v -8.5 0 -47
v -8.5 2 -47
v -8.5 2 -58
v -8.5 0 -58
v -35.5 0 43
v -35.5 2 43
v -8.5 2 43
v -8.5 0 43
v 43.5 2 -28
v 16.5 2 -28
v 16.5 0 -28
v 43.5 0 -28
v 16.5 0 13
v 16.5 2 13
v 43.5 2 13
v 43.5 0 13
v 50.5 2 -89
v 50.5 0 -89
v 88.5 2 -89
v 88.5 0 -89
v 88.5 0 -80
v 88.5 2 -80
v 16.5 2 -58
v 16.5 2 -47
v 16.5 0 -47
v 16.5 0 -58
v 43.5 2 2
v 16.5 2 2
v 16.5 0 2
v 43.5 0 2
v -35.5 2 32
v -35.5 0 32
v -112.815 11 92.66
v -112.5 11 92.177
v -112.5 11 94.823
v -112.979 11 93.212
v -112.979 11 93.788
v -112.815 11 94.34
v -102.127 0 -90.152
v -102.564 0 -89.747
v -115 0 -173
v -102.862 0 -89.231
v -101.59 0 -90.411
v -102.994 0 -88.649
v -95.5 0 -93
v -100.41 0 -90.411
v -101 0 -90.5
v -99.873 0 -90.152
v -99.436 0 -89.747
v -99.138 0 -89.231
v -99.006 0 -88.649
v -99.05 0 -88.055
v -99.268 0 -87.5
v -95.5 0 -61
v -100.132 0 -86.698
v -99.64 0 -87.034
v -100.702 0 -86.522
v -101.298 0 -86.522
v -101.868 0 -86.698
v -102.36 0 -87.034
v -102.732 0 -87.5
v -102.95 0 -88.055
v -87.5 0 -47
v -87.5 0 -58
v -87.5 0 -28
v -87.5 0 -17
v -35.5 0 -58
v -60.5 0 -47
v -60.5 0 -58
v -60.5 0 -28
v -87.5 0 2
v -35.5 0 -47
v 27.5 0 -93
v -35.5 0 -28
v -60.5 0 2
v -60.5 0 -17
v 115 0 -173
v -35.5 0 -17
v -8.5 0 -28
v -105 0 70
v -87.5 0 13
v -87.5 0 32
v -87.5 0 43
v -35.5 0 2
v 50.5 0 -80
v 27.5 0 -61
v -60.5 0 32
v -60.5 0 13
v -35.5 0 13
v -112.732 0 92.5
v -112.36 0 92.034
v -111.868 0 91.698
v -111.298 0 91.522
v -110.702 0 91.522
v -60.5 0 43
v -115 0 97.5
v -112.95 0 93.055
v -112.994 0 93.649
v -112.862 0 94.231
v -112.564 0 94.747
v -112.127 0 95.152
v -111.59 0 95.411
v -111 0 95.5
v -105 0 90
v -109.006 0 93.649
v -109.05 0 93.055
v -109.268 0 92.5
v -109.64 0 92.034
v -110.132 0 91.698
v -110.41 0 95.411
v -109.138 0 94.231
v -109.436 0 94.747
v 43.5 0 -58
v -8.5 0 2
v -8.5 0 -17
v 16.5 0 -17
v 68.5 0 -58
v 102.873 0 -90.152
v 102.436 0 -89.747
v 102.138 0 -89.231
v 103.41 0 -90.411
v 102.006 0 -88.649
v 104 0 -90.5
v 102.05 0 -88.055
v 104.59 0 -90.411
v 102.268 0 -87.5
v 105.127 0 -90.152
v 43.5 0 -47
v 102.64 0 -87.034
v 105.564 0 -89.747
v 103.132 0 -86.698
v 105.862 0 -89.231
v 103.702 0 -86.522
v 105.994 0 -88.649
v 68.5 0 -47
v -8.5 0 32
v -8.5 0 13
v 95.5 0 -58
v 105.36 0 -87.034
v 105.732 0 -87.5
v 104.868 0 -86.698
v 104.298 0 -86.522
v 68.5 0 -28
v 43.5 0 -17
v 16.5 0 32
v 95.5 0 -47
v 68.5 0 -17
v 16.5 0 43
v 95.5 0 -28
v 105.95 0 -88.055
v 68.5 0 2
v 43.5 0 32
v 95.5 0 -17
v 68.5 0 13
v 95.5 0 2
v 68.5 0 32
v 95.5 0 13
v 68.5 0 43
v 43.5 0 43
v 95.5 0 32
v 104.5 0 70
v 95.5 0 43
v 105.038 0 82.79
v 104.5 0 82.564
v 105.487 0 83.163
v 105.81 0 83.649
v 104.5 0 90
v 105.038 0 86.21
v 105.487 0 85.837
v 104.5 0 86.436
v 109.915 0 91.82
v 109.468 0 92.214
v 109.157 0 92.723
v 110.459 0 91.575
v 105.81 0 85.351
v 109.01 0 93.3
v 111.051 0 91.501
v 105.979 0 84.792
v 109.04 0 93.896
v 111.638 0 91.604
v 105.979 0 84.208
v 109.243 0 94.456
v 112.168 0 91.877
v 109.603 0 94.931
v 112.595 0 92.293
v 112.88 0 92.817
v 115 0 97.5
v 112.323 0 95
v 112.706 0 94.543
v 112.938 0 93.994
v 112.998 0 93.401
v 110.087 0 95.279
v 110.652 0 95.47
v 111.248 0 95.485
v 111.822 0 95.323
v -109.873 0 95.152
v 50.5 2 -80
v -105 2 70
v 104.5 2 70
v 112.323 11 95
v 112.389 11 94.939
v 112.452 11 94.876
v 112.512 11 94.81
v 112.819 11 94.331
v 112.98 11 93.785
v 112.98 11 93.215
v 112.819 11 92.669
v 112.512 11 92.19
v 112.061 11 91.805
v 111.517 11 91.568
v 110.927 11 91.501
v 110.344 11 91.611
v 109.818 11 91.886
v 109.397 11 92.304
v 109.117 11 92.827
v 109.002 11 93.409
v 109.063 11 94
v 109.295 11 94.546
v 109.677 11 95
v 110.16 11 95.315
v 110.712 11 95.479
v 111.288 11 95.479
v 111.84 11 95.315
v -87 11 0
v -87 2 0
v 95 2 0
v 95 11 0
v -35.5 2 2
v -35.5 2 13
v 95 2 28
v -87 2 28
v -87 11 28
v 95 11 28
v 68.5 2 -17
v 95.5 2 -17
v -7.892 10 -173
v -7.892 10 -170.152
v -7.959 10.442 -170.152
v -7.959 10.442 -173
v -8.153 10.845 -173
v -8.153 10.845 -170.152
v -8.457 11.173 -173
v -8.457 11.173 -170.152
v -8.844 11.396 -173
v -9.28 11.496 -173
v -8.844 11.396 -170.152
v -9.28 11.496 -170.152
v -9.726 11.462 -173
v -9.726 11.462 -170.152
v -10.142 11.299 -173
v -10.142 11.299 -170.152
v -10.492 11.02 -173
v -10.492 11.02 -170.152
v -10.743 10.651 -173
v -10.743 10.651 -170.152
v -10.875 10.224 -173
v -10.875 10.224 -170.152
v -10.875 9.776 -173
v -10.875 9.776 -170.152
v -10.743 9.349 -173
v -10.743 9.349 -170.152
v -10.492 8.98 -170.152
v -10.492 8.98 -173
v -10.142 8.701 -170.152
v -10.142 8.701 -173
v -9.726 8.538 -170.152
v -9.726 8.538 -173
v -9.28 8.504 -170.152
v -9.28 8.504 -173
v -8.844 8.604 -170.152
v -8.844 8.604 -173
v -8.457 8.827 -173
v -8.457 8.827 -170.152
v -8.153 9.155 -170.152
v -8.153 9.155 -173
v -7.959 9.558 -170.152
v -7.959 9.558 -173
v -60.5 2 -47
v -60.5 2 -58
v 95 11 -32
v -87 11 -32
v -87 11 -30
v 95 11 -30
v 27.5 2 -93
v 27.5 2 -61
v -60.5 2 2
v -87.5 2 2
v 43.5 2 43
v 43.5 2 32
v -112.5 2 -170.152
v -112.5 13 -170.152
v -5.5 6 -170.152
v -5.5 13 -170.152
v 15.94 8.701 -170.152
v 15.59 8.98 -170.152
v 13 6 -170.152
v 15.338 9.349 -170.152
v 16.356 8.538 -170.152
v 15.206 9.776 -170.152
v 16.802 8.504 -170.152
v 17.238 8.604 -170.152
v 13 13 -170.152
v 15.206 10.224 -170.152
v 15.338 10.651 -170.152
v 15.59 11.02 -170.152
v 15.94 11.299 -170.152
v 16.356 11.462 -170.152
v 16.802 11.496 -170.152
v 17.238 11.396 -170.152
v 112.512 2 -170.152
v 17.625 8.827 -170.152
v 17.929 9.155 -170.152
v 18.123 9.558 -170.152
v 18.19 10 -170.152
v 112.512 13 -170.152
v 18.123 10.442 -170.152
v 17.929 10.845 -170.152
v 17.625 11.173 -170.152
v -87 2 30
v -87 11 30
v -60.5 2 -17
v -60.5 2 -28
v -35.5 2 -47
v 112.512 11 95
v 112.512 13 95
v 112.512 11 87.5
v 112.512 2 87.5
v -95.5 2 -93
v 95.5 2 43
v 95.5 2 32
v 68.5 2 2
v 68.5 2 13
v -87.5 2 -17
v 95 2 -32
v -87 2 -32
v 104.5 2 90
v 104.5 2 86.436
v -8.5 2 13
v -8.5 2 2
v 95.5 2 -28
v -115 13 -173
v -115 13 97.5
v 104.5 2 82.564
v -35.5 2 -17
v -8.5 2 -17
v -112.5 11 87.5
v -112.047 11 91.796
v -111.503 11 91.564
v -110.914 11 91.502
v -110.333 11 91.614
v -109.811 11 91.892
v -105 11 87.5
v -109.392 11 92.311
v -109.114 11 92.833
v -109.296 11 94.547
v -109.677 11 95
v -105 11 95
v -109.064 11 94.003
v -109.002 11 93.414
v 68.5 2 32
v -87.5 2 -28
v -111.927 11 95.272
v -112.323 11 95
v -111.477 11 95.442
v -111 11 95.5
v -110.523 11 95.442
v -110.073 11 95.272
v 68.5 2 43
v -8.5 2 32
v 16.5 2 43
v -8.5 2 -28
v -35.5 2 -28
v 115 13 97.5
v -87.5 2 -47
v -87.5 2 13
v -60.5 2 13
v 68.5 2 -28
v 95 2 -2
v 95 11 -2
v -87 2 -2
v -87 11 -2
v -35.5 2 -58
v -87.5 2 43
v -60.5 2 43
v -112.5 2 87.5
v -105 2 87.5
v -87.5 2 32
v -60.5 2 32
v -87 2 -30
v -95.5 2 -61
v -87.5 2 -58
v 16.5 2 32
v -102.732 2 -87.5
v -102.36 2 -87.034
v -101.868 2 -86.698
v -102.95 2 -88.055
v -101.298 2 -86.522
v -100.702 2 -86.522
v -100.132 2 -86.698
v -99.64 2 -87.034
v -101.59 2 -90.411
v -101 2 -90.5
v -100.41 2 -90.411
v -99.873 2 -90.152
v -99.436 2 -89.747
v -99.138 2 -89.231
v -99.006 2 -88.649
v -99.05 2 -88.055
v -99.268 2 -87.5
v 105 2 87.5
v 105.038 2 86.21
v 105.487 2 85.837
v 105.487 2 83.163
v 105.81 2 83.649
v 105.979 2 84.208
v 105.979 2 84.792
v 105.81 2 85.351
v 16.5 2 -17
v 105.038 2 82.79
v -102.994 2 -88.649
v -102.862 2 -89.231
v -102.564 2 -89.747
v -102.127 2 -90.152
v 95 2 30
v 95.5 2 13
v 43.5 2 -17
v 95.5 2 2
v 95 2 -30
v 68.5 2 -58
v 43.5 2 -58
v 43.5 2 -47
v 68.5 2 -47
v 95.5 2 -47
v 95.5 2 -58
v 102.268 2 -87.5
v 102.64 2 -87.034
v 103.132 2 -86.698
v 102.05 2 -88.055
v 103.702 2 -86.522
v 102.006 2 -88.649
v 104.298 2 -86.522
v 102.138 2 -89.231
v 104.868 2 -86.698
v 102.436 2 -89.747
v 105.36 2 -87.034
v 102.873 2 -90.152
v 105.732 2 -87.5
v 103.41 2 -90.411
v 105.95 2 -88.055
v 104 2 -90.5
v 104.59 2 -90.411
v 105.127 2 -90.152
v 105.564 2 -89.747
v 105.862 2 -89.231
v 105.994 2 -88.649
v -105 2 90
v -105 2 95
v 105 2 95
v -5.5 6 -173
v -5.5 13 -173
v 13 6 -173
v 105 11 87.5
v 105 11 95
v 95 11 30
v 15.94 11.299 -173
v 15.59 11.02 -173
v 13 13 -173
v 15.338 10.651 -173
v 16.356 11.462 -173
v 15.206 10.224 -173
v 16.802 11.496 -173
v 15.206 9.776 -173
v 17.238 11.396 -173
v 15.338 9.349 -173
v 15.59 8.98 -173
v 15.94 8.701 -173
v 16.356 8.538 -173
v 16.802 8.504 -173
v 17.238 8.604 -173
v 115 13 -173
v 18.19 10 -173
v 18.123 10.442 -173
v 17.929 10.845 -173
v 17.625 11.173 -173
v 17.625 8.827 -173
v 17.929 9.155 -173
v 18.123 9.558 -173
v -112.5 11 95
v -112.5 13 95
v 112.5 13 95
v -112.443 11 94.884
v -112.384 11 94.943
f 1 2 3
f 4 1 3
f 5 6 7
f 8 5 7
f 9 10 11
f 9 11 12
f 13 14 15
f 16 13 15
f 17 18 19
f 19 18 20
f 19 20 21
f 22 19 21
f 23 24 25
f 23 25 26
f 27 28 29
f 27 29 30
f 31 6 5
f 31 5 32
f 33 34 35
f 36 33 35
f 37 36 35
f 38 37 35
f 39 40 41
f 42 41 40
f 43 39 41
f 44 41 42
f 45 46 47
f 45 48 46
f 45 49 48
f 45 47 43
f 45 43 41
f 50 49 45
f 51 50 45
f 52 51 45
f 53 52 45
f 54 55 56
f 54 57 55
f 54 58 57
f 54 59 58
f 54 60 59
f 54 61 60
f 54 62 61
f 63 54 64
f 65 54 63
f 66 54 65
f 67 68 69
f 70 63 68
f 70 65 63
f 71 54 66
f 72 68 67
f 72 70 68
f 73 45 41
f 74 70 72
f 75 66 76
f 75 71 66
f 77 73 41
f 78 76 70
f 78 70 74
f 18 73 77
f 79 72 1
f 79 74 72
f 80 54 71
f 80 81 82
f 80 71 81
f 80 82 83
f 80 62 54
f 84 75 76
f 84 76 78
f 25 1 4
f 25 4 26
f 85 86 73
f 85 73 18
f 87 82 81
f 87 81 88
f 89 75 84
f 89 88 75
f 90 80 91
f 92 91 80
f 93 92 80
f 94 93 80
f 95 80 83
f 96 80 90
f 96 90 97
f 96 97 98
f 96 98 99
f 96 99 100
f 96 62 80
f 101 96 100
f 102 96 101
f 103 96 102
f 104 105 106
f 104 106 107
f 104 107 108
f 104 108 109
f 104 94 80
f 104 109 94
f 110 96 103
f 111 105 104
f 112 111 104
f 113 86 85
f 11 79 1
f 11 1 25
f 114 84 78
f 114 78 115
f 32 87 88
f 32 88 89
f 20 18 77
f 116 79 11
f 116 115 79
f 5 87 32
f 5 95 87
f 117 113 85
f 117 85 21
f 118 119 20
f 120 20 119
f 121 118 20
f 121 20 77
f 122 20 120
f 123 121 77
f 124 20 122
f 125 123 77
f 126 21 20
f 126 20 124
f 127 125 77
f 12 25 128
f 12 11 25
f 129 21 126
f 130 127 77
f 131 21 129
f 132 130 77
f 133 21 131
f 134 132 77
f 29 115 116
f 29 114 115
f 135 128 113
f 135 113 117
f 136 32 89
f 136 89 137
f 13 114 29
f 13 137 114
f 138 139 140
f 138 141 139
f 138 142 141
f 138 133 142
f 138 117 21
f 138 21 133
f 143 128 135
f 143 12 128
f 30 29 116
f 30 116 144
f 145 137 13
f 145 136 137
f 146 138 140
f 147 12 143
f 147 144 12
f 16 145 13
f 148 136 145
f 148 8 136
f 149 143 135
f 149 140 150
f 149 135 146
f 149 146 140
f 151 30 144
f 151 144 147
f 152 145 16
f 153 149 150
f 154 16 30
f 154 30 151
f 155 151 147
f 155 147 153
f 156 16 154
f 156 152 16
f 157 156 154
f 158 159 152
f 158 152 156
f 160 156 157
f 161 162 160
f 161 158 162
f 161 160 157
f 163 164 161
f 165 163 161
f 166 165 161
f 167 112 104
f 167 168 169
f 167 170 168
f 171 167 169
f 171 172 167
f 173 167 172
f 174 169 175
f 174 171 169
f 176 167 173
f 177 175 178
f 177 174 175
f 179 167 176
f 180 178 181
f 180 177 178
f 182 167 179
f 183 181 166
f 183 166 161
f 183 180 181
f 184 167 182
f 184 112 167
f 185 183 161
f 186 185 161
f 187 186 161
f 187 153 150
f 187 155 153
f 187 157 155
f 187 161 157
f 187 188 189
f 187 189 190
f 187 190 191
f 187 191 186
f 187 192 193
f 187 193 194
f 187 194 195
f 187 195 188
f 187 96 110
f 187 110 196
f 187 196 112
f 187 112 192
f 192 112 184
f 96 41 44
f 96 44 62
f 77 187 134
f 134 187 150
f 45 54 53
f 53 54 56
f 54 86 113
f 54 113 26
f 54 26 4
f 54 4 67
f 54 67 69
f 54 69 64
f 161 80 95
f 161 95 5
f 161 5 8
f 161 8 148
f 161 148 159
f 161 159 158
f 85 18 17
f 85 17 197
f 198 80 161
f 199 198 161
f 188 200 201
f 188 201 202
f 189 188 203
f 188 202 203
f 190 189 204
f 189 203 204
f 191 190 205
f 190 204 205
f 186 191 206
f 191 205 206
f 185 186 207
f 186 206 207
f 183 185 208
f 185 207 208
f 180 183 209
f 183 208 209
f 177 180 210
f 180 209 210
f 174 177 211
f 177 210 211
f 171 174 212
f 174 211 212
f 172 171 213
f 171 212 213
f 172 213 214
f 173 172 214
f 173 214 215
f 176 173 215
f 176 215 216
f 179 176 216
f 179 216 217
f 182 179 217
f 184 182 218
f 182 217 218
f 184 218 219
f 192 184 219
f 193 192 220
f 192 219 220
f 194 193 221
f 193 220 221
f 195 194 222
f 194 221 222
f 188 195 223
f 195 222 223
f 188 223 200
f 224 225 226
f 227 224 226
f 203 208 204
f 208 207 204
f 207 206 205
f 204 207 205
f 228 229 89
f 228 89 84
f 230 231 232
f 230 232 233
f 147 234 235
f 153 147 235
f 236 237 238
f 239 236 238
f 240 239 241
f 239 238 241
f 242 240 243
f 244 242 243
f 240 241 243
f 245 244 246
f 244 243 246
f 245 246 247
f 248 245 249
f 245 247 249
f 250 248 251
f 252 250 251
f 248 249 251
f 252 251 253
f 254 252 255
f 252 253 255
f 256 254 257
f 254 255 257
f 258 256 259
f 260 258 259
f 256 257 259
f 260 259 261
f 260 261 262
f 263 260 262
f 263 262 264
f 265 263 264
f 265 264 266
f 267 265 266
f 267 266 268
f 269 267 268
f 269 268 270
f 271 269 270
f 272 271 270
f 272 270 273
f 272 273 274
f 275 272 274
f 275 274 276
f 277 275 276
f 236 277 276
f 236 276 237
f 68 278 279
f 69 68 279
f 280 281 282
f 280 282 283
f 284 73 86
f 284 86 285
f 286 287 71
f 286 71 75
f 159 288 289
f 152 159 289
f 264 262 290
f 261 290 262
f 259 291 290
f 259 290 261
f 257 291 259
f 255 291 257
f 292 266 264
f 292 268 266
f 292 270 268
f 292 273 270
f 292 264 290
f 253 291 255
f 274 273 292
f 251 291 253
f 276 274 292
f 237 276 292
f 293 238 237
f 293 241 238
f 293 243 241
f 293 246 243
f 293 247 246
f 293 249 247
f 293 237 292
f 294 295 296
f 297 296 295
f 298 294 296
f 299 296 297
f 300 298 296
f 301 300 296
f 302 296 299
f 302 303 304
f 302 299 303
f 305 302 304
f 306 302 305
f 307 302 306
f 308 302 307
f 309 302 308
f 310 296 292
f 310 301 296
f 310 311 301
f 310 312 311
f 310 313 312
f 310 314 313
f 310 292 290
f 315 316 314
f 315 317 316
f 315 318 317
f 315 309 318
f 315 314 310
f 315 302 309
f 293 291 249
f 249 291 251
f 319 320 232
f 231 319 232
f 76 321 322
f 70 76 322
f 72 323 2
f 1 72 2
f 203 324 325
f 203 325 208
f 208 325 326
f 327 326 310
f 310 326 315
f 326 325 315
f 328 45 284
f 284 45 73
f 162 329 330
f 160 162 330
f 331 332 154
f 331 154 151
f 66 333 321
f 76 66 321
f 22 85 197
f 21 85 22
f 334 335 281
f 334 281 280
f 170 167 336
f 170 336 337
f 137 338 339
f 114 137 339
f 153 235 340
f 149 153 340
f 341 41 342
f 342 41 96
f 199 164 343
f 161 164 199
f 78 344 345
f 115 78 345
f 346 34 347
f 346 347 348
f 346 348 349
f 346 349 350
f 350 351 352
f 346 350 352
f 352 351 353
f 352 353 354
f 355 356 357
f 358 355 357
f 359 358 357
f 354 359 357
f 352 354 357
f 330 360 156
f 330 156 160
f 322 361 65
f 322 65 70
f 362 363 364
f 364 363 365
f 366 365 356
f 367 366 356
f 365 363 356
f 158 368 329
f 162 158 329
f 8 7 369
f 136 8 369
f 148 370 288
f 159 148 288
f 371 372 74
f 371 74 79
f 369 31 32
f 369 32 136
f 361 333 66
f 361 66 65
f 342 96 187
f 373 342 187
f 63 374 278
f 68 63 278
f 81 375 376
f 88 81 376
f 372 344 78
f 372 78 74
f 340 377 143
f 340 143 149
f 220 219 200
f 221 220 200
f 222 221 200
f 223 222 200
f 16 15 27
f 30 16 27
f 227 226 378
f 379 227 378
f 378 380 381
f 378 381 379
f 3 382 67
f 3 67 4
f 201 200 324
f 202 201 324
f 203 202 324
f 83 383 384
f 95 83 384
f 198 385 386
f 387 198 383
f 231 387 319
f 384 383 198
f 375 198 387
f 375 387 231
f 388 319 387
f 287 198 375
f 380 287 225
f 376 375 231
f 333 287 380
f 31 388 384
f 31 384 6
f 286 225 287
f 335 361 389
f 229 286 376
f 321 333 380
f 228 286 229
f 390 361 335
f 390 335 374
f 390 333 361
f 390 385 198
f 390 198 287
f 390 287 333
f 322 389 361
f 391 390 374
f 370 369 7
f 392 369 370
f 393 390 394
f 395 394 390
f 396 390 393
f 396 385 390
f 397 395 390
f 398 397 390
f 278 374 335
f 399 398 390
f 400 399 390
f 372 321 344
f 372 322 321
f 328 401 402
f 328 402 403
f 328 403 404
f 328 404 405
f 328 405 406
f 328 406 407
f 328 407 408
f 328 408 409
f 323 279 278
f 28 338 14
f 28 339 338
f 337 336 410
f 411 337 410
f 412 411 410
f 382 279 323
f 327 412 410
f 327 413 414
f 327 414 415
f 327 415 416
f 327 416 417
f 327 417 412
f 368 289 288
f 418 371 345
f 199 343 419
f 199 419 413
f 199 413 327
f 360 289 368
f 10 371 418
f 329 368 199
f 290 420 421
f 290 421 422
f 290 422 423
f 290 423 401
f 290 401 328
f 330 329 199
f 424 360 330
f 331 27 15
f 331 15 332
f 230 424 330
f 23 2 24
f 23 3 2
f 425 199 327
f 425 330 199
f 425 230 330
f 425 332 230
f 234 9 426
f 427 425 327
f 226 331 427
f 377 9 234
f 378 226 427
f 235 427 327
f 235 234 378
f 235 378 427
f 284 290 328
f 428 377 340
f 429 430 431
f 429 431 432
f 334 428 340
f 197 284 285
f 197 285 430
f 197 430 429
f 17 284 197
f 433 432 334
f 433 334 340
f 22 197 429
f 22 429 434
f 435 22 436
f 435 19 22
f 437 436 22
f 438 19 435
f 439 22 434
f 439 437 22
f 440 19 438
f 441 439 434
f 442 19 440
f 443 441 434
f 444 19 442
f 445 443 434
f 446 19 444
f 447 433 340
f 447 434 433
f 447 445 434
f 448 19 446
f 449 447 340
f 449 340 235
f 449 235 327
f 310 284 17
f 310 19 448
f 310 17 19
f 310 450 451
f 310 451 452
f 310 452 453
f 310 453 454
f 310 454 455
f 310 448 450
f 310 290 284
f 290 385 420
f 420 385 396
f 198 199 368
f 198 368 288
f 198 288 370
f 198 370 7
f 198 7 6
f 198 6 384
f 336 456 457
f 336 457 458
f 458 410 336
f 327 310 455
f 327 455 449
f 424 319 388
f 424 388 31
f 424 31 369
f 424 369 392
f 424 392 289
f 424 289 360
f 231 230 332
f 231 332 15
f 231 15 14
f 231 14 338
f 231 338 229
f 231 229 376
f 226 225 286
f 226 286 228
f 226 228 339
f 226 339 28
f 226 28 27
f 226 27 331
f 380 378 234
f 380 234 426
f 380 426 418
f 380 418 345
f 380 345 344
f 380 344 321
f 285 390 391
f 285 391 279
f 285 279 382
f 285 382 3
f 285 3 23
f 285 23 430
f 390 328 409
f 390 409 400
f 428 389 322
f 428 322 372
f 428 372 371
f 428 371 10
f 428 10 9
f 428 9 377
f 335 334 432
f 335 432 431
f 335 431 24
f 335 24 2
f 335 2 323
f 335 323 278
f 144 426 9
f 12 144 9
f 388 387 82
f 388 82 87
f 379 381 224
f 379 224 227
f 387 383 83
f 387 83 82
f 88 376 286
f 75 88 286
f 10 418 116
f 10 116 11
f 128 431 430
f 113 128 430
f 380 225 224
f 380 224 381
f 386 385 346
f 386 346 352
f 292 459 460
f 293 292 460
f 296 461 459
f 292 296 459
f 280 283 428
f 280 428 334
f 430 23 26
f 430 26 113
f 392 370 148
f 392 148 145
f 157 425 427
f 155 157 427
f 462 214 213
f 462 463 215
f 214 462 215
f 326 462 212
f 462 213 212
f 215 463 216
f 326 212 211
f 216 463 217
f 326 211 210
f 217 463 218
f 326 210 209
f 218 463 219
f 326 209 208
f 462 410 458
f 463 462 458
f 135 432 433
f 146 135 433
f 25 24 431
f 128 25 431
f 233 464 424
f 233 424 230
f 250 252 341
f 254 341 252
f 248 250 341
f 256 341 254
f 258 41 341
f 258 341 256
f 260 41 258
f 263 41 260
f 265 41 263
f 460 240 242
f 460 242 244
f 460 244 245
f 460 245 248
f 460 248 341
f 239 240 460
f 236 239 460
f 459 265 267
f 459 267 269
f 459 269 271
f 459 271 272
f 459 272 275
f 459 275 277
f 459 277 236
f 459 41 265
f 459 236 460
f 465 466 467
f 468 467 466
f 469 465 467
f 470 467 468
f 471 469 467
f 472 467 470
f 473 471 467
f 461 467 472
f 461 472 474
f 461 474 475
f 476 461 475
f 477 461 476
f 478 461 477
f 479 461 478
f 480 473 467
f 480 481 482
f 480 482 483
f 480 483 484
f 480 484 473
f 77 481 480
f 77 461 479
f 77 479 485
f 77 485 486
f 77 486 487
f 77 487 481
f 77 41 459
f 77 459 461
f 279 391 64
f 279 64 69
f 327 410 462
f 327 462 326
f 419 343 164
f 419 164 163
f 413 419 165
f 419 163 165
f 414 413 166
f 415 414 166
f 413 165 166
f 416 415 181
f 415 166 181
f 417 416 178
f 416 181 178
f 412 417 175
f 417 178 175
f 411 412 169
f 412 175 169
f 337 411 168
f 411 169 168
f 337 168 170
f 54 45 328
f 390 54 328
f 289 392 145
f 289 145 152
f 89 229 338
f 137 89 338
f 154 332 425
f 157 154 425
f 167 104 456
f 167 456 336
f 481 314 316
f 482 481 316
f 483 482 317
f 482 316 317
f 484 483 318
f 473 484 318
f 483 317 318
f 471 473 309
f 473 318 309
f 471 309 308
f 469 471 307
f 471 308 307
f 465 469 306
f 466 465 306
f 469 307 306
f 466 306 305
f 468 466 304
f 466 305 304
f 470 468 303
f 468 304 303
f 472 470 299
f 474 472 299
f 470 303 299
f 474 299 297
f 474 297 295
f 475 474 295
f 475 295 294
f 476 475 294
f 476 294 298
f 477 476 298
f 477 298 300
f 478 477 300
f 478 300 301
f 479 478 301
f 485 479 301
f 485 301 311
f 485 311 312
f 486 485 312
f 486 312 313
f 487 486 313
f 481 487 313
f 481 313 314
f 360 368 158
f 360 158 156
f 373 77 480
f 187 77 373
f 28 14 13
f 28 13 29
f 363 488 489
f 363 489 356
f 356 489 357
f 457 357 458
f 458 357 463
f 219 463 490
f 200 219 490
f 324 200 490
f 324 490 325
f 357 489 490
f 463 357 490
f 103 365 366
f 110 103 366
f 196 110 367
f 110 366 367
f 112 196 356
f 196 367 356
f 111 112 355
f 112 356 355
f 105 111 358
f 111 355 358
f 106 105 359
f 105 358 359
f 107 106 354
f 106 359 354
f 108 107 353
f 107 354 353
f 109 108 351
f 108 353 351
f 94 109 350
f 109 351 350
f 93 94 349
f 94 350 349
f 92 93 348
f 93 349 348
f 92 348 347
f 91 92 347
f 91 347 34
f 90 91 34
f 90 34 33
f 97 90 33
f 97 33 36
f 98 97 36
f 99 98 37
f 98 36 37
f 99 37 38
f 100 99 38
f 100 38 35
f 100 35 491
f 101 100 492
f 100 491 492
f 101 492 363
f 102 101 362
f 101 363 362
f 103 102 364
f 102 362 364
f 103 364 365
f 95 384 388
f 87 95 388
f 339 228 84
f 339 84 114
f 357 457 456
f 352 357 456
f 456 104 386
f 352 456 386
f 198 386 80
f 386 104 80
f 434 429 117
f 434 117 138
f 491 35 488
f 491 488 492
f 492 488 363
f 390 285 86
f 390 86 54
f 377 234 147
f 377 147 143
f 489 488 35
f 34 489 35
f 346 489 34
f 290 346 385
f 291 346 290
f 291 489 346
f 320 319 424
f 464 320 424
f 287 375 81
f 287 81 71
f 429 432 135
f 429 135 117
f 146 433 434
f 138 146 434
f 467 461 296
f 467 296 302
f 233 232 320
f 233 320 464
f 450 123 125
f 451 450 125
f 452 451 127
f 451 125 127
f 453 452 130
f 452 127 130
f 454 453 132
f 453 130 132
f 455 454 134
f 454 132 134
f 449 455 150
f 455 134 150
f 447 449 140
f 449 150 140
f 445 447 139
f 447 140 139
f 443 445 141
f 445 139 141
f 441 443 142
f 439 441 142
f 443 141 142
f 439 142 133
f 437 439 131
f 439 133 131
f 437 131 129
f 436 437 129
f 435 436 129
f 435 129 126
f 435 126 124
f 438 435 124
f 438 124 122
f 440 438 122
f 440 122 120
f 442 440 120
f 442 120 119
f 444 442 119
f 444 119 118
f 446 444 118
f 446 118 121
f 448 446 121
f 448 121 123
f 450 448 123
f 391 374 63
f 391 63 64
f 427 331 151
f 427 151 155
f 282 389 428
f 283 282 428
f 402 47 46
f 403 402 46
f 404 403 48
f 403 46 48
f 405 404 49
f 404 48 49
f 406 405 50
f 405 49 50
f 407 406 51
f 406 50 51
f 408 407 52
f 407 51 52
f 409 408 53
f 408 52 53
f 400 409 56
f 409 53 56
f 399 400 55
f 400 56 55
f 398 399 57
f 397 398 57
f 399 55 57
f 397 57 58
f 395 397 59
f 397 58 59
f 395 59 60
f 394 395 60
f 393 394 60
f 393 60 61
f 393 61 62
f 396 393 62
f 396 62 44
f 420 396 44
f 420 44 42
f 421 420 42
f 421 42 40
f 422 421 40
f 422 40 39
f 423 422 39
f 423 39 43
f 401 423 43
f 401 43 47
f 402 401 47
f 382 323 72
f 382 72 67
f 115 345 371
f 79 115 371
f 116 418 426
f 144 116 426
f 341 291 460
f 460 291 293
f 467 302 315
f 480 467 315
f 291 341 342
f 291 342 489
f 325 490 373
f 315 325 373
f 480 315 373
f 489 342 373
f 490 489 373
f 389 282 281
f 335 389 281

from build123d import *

# Parameters (mm, degrees)
ESQUISSE3_W              = 225
ESQUISSE3_H              = 190
ESQUISSE3_W_2            = 209.5
ESQUISSE3_H_2            = 20
ESQUISSE3_W_3            = 123
ESQUISSE3_H_3            = 30
BLOC_COQUE_DEPTH         = 16
ESQUISSE5_W              = 27
ESQUISSE5_H              = 11
TROU_CARTOUCHE_DEPTH     = 149.112288484
COQUE5_START             = -61
COQUE5_OUTLINE_W         = 13
COQUE5_OUTLINE_H         = 14
COQUE5_OUTLINE_W_2       = 21
COQUE5_DEPTH             = 129
COQUE5_START_2           = -93
COQUE5_2_OUTLINE_W       = 81
COQUE5_2_OUTLINE_H       = 14
COQUE5_2_OUTLINE_W_2     = 13
COQUE5_2_DEPTH           = 33
COQUE5_START_3           = 45
COQUE5_3_OUTLINE_W       = 31
COQUE5_3_OUTLINE_H       = 14
COQUE5_3_DEPTH           = 23
COQUE5_START_4           = -45
COQUE5_4_OUTLINE_W       = 31
COQUE5_4_OUTLINE_H       = 14
COQUE5_4_DEPTH           = 15
COQUE5_START_5           = -15
COQUE5_5_OUTLINE_W       = 31
COQUE5_5_OUTLINE_H       = 14
COQUE5_5_DEPTH           = 15
COQUE5_START_6           = 15
COQUE5_6_OUTLINE_W       = 31
COQUE5_6_OUTLINE_H       = 14
COQUE5_6_DEPTH           = 15
COQUE5_START_7           = 92
COQUE5_7_OUTLINE_W       = 221
COQUE5_7_OUTLINE_H       = 14
COQUE5_7_DEPTH           = 1
COQUE5_START_8           = 68
COQUE5_8_OUTLINE_W       = 4
COQUE5_8_OUTLINE_H       = 14
COQUE5_8_OUTLINE_W_2     = 3.5
COQUE5_8_DEPTH           = 24
COQUE5_9_OUTLINE_W       = 15
COQUE5_9_OUTLINE_H       = 14
COQUE5_9_OUTLINE_W_2     = 31
COQUE5_9_DEPTH           = 1
ESQUISSE6_W              = 138
ESQUISSE6_H              = 183.5
LOGEMENT_CARTE_DEPTH     = 6
ESQUISSE10_R             = 2
ENL_V_MAT_EXTRU_2_DEPTH  = 15
ESQUISSE12_W             = 100
ESQUISSE12_H             = 186
ENL_V_MAT_EXTRU_4_DEPTH  = 6
ESQUISSE13_W             = 123
ESQUISSE13_H             = 10
ENL_V_MAT_EXTRU_5_DEPTH  = 2
ESQUISSE14_W             = 200
ESQUISSE14_H             = 108.975087814
ENL_V_MAT_EXTRU_6_DEPTH  = 8
ESQUISSE16_W             = 38
ESQUISSE16_H             = 9
ENL_V_MAT_EXTRU_7_DEPTH  = 10
ESQUISSE17_W             = 230
ESQUISSE17_H             = 195
ESQUISSE17_W_2           = 225
ESQUISSE17_H_2           = 190
BOSS_EXTRU_2_DEPTH       = 13
ESQUISSE18_W             = 230
ESQUISSE18_H             = 4.5
ENL_V_MAT_EXTRU_8_DEPTH  = 152.328285525
ESQUISSE20_W             = 230
ESQUISSE20_H             = 80
BOSS_EXTRU_3_DEPTH       = 13
ESQUISSE21_W             = 225
ESQUISSE21_H             = 75.152232857
ENL_V_MAT_EXTRU_9_DEPTH  = 7
ESQUISSE25_W             = 18.5
ESQUISSE25_H             = 9.5
ENL_V_MAT_EXTRU_11_DEPTH = 10
ESQUISSE29_R             = 1.5
ENL_V_MAT_EXTRU_14_DEPTH = 6
ESQUISSE36_W             = 225.011669516
ESQUISSE36_H             = 265.152232857
ENL_V_MAT_EXTRU_18_DEPTH = 14
ESQUISSE30_W             = 10
ESQUISSE30_H             = 10
BOSS_EXTRU_4_DEPTH       = 11
ESQUISSE33_R             = 2
ENL_V_MAT_EXTRU_16_DEPTH = 209.026440627
ESQUISSE37_W             = 182
ESQUISSE37_H             = 2
BOSS_EXTRU_6_DEPTH       = 9


# Read off the part's stored shape, not the designer's step: Coque5
with BuildPart() as part:
    # Esquisse3 → Bloc coque (new body)
    with BuildSketch(Plane(origin=(0, 0, 0), x_dir=(1, 0, 0), z_dir=(0, 1, 0))):
        Rectangle(ESQUISSE3_W, ESQUISSE3_H)
        with Locations((-0.25, -80)):
            Rectangle(ESQUISSE3_W_2, ESQUISSE3_H_2, mode=Mode.SUBTRACT)
        with Locations((-34, 78)):
            Rectangle(ESQUISSE3_W_3, ESQUISSE3_H_3, mode=Mode.SUBTRACT)
    extrude(amount=BLOC_COQUE_DEPTH)

    # Esquisse5 → Trou cartouche (cut, through all)
    with BuildSketch(Plane(origin=(0, 16, 0), x_dir=(1, 0, 0), z_dir=(0, 1, 0))):
        with Locations((-74, 52.5)):
            Rectangle(ESQUISSE5_W, ESQUISSE5_H)
        with Locations((-22, 52.5)):
            Rectangle(ESQUISSE5_W, ESQUISSE5_H)
        with Locations((30, 52.5)):
            Rectangle(ESQUISSE5_W, ESQUISSE5_H)
        with Locations((82, 52.5)):
            Rectangle(ESQUISSE5_W, ESQUISSE5_H)
        with Locations((-22, 22.5)):
            Rectangle(ESQUISSE5_W, ESQUISSE5_H)
        with Locations((30, 22.5)):
            Rectangle(ESQUISSE5_W, ESQUISSE5_H)
        with Locations((82, 22.5)):
            Rectangle(ESQUISSE5_W, ESQUISSE5_H)
        with Locations((-22, -7.5)):
            Rectangle(ESQUISSE5_W, ESQUISSE5_H)
        with Locations((30, -7.5)):
            Rectangle(ESQUISSE5_W, ESQUISSE5_H)
        with Locations((82, -7.5)):
            Rectangle(ESQUISSE5_W, ESQUISSE5_H)
        with Locations((-22, -37.5)):
            Rectangle(ESQUISSE5_W, ESQUISSE5_H)
        with Locations((30, -37.5)):
            Rectangle(ESQUISSE5_W, ESQUISSE5_H)
        with Locations((82, -37.5)):
            Rectangle(ESQUISSE5_W, ESQUISSE5_H)
        with Locations((-74, 22.5)):
            Rectangle(ESQUISSE5_W, ESQUISSE5_H)
        with Locations((-74, -7.5)):
            Rectangle(ESQUISSE5_W, ESQUISSE5_H)
        with Locations((-74, -37.5)):
            Rectangle(ESQUISSE5_W, ESQUISSE5_H)
    extrude(amount=-TROU_CARTOUCHE_DEPTH, mode=Mode.SUBTRACT)

    # Coque5 outline → Coque5 (cut)
    with BuildSketch(Plane.XY.offset(COQUE5_START)):
        with Locations((104, 9)):
            Rectangle(COQUE5_OUTLINE_W, COQUE5_OUTLINE_H)
        with Locations((56, 9)):
            Rectangle(COQUE5_OUTLINE_W_2, COQUE5_OUTLINE_H)
        with Locations((4, 9)):
            Rectangle(COQUE5_OUTLINE_W_2, COQUE5_OUTLINE_H)
        with Locations((-48, 9)):
            Rectangle(COQUE5_OUTLINE_W_2, COQUE5_OUTLINE_H)
        with Locations((-100, 9)):
            Rectangle(COQUE5_OUTLINE_W_2, COQUE5_OUTLINE_H)
    extrude(amount=COQUE5_DEPTH, mode=Mode.SUBTRACT)

    # Coque5 2 outline → Coque5 2 (cut)
    with BuildSketch(Plane.XY.offset(COQUE5_START_2)):
        with Locations((70, 9)):
            Rectangle(COQUE5_2_OUTLINE_W, COQUE5_2_OUTLINE_H)
        with Locations((-104, 9)):
            Rectangle(COQUE5_2_OUTLINE_W_2, COQUE5_2_OUTLINE_H)
    extrude(amount=COQUE5_2_DEPTH, mode=Mode.SUBTRACT)

    # Coque5 3 outline → Coque5 3 (cut)
    with BuildSketch(Plane.XY.offset(COQUE5_START_3)):
        with Locations((82, 9)):
            Rectangle(COQUE5_3_OUTLINE_W, COQUE5_3_OUTLINE_H)
        with Locations((30, 9)):
            Rectangle(COQUE5_3_OUTLINE_W, COQUE5_3_OUTLINE_H)
        with Locations((-22, 9)):
            Rectangle(COQUE5_3_OUTLINE_W, COQUE5_3_OUTLINE_H)
        with Locations((-74, 9)):
            Rectangle(COQUE5_3_OUTLINE_W, COQUE5_3_OUTLINE_H)
    extrude(amount=COQUE5_3_DEPTH, mode=Mode.SUBTRACT)

    # Coque5 4 outline → Coque5 4 (cut)
    with BuildSketch(Plane.XY.offset(COQUE5_START_4)):
        with Locations((82, 9)):
            Rectangle(COQUE5_4_OUTLINE_W, COQUE5_4_OUTLINE_H)
        with Locations((30, 9)):
            Rectangle(COQUE5_4_OUTLINE_W, COQUE5_4_OUTLINE_H)
        with Locations((-22, 9)):
            Rectangle(COQUE5_4_OUTLINE_W, COQUE5_4_OUTLINE_H)
        with Locations((-74, 9)):
            Rectangle(COQUE5_4_OUTLINE_W, COQUE5_4_OUTLINE_H)
    extrude(amount=COQUE5_4_DEPTH, mode=Mode.SUBTRACT)

    # Coque5 5 outline → Coque5 5 (cut)
    with BuildSketch(Plane.XY.offset(COQUE5_START_5)):
        with Locations((82, 9)):
            Rectangle(COQUE5_5_OUTLINE_W, COQUE5_5_OUTLINE_H)
        with Locations((30, 9)):
            Rectangle(COQUE5_5_OUTLINE_W, COQUE5_5_OUTLINE_H)
        with Locations((-22, 9)):
            Rectangle(COQUE5_5_OUTLINE_W, COQUE5_5_OUTLINE_H)
        with Locations((-74, 9)):
            Rectangle(COQUE5_5_OUTLINE_W, COQUE5_5_OUTLINE_H)
    extrude(amount=COQUE5_5_DEPTH, mode=Mode.SUBTRACT)

    # Coque5 6 outline → Coque5 6 (cut)
    with BuildSketch(Plane.XY.offset(COQUE5_START_6)):
        with Locations((82, 9)):
            Rectangle(COQUE5_6_OUTLINE_W, COQUE5_6_OUTLINE_H)
        with Locations((30, 9)):
            Rectangle(COQUE5_6_OUTLINE_W, COQUE5_6_OUTLINE_H)
        with Locations((-22, 9)):
            Rectangle(COQUE5_6_OUTLINE_W, COQUE5_6_OUTLINE_H)
        with Locations((-74, 9)):
            Rectangle(COQUE5_6_OUTLINE_W, COQUE5_6_OUTLINE_H)
    extrude(amount=COQUE5_6_DEPTH, mode=Mode.SUBTRACT)

    # Coque5 7 outline → Coque5 7 (cut)
    with BuildSketch(Plane.XY.offset(COQUE5_START_7)):
        with Locations((0, 9)):
            Rectangle(COQUE5_7_OUTLINE_W, COQUE5_7_OUTLINE_H)
    extrude(amount=COQUE5_7_DEPTH, mode=Mode.SUBTRACT)

    # Coque5 8 outline → Coque5 8 (cut)
    with BuildSketch(Plane.XY.offset(COQUE5_START_8)):
        with Locations((108.5, 9)):
            Rectangle(COQUE5_8_OUTLINE_W, COQUE5_8_OUTLINE_H)
        with Locations((-108.75, 9)):
            Rectangle(COQUE5_8_OUTLINE_W_2, COQUE5_8_OUTLINE_H)
    extrude(amount=COQUE5_8_DEPTH, mode=Mode.SUBTRACT)

    # Coque5 9 outline → Coque5 9 (cut)
    with BuildSketch(Plane.XY.offset(COQUE5_START)):
        with Locations((22, 9)):
            Rectangle(COQUE5_9_OUTLINE_W, COQUE5_9_OUTLINE_H)
        with Locations((-22, 9)):
            Rectangle(COQUE5_9_OUTLINE_W_2, COQUE5_9_OUTLINE_H)
        with Locations((-74, 9)):
            Rectangle(COQUE5_9_OUTLINE_W_2, COQUE5_9_OUTLINE_H)
    extrude(amount=COQUE5_9_DEPTH, mode=Mode.SUBTRACT)

    # Esquisse6 → Logement carte (cut)
    with BuildSketch(Plane(origin=(0, 16, 0), x_dir=(1, 0, 0), z_dir=(0, 1, 0))):
        with Locations((-41.5, 1.25)):
            Rectangle(ESQUISSE6_W, ESQUISSE6_H)
    extrude(amount=-LOGEMENT_CARTE_DEPTH, mode=Mode.SUBTRACT)

    # Esquisse10 → Enlèv. mat.-Extru.2 (cut)
    with BuildSketch(Plane(origin=(0, 0, 0), x_dir=(-1, 0, 0), z_dir=(0, -1, 0))):
        with Locations(Location((-104, 88.5, 0), (0, 0, 90))):
            Circle(ESQUISSE10_R)
        with Locations(Location((101, 88.5, 0), (0, 0, 90))):
            Circle(ESQUISSE10_R)
        with Locations((-104, -84.5)):
            Circle(ESQUISSE10_R)
    extrude(amount=-ENL_V_MAT_EXTRU_2_DEPTH, mode=Mode.SUBTRACT)

    # Esquisse12 → Enlèv. mat.-Extru.4 (cut)
    with BuildSketch(Plane(origin=(0, 16, 0), x_dir=(1, 0, 0), z_dir=(0, 1, 0))):
        with Locations((60.5, 0)):
            Rectangle(ESQUISSE12_W, ESQUISSE12_H)
    extrude(amount=-ENL_V_MAT_EXTRU_4_DEPTH, mode=Mode.SUBTRACT)

    # Esquisse13 → Enlèv. mat.-Extru.5 (cut)
    with BuildSketch(Plane(origin=(0, 0, -63), x_dir=(-1, 0, 0), z_dir=(0, 0, -1))):
        with Locations((34, 5)):
            Rectangle(ESQUISSE13_W, ESQUISSE13_H)
    extrude(amount=-ENL_V_MAT_EXTRU_5_DEPTH, mode=Mode.SUBTRACT)

    # Esquisse14 → Enlèv. mat.-Extru.6 (cut)
    with BuildSketch(Plane(origin=(0, 10, 0), x_dir=(1, 0, 0), z_dir=(0, 1, 0))):
        with Locations((4.5, 6.512456093)):
            Rectangle(ESQUISSE14_W, ESQUISSE14_H)
    extrude(amount=-ENL_V_MAT_EXTRU_6_DEPTH, mode=Mode.SUBTRACT)

    # Esquisse16 → Enlèv. mat.-Extru.7 (cut)
    with BuildSketch(Plane.XZ):
        with Locations((69.5, -84.5)):
            Rectangle(ESQUISSE16_W, ESQUISSE16_H)
    extrude(amount=-ENL_V_MAT_EXTRU_7_DEPTH, mode=Mode.SUBTRACT)


with BuildPart() as body_2:
    # Esquisse17 → Boss.-Extru.2 (new body)
    with BuildSketch(Plane.XZ):
        Rectangle(ESQUISSE17_W, ESQUISSE17_H)
        Rectangle(ESQUISSE17_W_2, ESQUISSE17_H_2, mode=Mode.SUBTRACT)
    extrude(amount=-BOSS_EXTRU_2_DEPTH)


with BuildPart() as enl_v_mat_extru_8_tool:
    # Esquisse18 → Enlèv. mat.-Extru.8 (new, through all)
    with BuildSketch(Plane(origin=(0, 13, 0), x_dir=(1, 0, 0), z_dir=(0, 1, 0))):
        with Locations((0, 95.25)):
            Rectangle(ESQUISSE18_W, ESQUISSE18_H)
    extrude(amount=-ENL_V_MAT_EXTRU_8_DEPTH)


with BuildPart() as part_1:
    add(part.part)

    # Enlèv. mat.-Extru.8: cut by enl_v_mat_extru_8_tool
    add(enl_v_mat_extru_8_tool.part, mode=Mode.SUBTRACT)



with BuildPart() as body_2_1:
    add(body_2.part)

    # Enlèv. mat.-Extru.8: cut by enl_v_mat_extru_8_tool
    add(enl_v_mat_extru_8_tool.part, mode=Mode.SUBTRACT)


with BuildPart() as part_2:
    add(part_1.part)

    add(body_2_1.part)  # Boss.-Extru.3 merges body 2
    # Esquisse20 → Boss.-Extru.3 (add)
    with BuildSketch(Plane.XZ):
        with Locations((0, -133)):
            Rectangle(ESQUISSE20_W, ESQUISSE20_H)
    extrude(amount=-BOSS_EXTRU_3_DEPTH)

    # Esquisse21 → Enlèv. mat.-Extru.9 (cut)
    with BuildSketch(Plane(origin=(0, 13, 0), x_dir=(1, 0, 0), z_dir=(0, 1, 0))):
        with Locations((0, 132.576116429)):
            Rectangle(ESQUISSE21_W, ESQUISSE21_H)
    extrude(amount=-ENL_V_MAT_EXTRU_9_DEPTH, mode=Mode.SUBTRACT)

    # Esquisse25 → Enlèv. mat.-Extru.11 (cut)
    with BuildSketch(Plane(origin=(0, 0, -173), x_dir=(-1, 0, 0), z_dir=(0, 0, -1))):
        with Locations((-3.75, 10.75)):
            Rectangle(ESQUISSE25_W, ESQUISSE25_H)
    extrude(amount=-ENL_V_MAT_EXTRU_11_DEPTH, mode=Mode.SUBTRACT)

    # Esquisse29 → Enlèv. mat.-Extru.14 (cut)
    with BuildSketch(Plane.XY.offset(-170.152232857)):
        with Locations((16.689639813, 10)):
            Circle(ESQUISSE29_R)
        with Locations((-9.392025581, 10)):
            Circle(ESQUISSE29_R)
    extrude(amount=-ENL_V_MAT_EXTRU_14_DEPTH, mode=Mode.SUBTRACT)

    # Esquisse36 → Enlèv. mat.-Extru.18 (cut)
    with BuildSketch(Plane(origin=(0, 16, 0), x_dir=(1, 0, 0), z_dir=(0, 1, 0))):
        with Locations((0.005834758, 37.576116429)):
            Rectangle(ESQUISSE36_W, ESQUISSE36_H)
    extrude(amount=-ENL_V_MAT_EXTRU_18_DEPTH, mode=Mode.SUBTRACT)

    # Esquisse30 → Boss.-Extru.4 (add)
    with BuildSketch(Plane.XZ):
        with Locations((110, 92.5)):
            Rectangle(ESQUISSE30_W, ESQUISSE30_H)
        with Locations((-110, 92.5)):
            Rectangle(ESQUISSE30_W, ESQUISSE30_H)
    extrude(amount=-BOSS_EXTRU_4_DEPTH)

    # Esquisse33 → Enlèv. mat.-Extru.16 (cut, through all)
    with BuildSketch(Plane(origin=(0, 11, 0), x_dir=(1, 0, 0), z_dir=(0, 1, 0))):
        with Locations(Location((-111, -93.5, 0), (0, 0, 270))):
            Circle(ESQUISSE33_R)
        with Locations(Location((111, -93.5, 0), (0, 0, 311.409622109))):
            Circle(ESQUISSE33_R)
    extrude(amount=-ENL_V_MAT_EXTRU_16_DEPTH, mode=Mode.SUBTRACT)

    # Esquisse37 → Boss.-Extru.6 (add)
    with BuildSketch(Plane(origin=(0, 2, 0), x_dir=(1, 0, 0), z_dir=(0, 1, 0))):
        with Locations((4, -29)):
            Rectangle(ESQUISSE37_W, ESQUISSE37_H)
        with Locations((4, 1)):
            Rectangle(ESQUISSE37_W, ESQUISSE37_H)
        with Locations((4, 31)):
            Rectangle(ESQUISSE37_W, ESQUISSE37_H)
    extrude(amount=BOSS_EXTRU_6_DEPTH)


solid = part_2.part
